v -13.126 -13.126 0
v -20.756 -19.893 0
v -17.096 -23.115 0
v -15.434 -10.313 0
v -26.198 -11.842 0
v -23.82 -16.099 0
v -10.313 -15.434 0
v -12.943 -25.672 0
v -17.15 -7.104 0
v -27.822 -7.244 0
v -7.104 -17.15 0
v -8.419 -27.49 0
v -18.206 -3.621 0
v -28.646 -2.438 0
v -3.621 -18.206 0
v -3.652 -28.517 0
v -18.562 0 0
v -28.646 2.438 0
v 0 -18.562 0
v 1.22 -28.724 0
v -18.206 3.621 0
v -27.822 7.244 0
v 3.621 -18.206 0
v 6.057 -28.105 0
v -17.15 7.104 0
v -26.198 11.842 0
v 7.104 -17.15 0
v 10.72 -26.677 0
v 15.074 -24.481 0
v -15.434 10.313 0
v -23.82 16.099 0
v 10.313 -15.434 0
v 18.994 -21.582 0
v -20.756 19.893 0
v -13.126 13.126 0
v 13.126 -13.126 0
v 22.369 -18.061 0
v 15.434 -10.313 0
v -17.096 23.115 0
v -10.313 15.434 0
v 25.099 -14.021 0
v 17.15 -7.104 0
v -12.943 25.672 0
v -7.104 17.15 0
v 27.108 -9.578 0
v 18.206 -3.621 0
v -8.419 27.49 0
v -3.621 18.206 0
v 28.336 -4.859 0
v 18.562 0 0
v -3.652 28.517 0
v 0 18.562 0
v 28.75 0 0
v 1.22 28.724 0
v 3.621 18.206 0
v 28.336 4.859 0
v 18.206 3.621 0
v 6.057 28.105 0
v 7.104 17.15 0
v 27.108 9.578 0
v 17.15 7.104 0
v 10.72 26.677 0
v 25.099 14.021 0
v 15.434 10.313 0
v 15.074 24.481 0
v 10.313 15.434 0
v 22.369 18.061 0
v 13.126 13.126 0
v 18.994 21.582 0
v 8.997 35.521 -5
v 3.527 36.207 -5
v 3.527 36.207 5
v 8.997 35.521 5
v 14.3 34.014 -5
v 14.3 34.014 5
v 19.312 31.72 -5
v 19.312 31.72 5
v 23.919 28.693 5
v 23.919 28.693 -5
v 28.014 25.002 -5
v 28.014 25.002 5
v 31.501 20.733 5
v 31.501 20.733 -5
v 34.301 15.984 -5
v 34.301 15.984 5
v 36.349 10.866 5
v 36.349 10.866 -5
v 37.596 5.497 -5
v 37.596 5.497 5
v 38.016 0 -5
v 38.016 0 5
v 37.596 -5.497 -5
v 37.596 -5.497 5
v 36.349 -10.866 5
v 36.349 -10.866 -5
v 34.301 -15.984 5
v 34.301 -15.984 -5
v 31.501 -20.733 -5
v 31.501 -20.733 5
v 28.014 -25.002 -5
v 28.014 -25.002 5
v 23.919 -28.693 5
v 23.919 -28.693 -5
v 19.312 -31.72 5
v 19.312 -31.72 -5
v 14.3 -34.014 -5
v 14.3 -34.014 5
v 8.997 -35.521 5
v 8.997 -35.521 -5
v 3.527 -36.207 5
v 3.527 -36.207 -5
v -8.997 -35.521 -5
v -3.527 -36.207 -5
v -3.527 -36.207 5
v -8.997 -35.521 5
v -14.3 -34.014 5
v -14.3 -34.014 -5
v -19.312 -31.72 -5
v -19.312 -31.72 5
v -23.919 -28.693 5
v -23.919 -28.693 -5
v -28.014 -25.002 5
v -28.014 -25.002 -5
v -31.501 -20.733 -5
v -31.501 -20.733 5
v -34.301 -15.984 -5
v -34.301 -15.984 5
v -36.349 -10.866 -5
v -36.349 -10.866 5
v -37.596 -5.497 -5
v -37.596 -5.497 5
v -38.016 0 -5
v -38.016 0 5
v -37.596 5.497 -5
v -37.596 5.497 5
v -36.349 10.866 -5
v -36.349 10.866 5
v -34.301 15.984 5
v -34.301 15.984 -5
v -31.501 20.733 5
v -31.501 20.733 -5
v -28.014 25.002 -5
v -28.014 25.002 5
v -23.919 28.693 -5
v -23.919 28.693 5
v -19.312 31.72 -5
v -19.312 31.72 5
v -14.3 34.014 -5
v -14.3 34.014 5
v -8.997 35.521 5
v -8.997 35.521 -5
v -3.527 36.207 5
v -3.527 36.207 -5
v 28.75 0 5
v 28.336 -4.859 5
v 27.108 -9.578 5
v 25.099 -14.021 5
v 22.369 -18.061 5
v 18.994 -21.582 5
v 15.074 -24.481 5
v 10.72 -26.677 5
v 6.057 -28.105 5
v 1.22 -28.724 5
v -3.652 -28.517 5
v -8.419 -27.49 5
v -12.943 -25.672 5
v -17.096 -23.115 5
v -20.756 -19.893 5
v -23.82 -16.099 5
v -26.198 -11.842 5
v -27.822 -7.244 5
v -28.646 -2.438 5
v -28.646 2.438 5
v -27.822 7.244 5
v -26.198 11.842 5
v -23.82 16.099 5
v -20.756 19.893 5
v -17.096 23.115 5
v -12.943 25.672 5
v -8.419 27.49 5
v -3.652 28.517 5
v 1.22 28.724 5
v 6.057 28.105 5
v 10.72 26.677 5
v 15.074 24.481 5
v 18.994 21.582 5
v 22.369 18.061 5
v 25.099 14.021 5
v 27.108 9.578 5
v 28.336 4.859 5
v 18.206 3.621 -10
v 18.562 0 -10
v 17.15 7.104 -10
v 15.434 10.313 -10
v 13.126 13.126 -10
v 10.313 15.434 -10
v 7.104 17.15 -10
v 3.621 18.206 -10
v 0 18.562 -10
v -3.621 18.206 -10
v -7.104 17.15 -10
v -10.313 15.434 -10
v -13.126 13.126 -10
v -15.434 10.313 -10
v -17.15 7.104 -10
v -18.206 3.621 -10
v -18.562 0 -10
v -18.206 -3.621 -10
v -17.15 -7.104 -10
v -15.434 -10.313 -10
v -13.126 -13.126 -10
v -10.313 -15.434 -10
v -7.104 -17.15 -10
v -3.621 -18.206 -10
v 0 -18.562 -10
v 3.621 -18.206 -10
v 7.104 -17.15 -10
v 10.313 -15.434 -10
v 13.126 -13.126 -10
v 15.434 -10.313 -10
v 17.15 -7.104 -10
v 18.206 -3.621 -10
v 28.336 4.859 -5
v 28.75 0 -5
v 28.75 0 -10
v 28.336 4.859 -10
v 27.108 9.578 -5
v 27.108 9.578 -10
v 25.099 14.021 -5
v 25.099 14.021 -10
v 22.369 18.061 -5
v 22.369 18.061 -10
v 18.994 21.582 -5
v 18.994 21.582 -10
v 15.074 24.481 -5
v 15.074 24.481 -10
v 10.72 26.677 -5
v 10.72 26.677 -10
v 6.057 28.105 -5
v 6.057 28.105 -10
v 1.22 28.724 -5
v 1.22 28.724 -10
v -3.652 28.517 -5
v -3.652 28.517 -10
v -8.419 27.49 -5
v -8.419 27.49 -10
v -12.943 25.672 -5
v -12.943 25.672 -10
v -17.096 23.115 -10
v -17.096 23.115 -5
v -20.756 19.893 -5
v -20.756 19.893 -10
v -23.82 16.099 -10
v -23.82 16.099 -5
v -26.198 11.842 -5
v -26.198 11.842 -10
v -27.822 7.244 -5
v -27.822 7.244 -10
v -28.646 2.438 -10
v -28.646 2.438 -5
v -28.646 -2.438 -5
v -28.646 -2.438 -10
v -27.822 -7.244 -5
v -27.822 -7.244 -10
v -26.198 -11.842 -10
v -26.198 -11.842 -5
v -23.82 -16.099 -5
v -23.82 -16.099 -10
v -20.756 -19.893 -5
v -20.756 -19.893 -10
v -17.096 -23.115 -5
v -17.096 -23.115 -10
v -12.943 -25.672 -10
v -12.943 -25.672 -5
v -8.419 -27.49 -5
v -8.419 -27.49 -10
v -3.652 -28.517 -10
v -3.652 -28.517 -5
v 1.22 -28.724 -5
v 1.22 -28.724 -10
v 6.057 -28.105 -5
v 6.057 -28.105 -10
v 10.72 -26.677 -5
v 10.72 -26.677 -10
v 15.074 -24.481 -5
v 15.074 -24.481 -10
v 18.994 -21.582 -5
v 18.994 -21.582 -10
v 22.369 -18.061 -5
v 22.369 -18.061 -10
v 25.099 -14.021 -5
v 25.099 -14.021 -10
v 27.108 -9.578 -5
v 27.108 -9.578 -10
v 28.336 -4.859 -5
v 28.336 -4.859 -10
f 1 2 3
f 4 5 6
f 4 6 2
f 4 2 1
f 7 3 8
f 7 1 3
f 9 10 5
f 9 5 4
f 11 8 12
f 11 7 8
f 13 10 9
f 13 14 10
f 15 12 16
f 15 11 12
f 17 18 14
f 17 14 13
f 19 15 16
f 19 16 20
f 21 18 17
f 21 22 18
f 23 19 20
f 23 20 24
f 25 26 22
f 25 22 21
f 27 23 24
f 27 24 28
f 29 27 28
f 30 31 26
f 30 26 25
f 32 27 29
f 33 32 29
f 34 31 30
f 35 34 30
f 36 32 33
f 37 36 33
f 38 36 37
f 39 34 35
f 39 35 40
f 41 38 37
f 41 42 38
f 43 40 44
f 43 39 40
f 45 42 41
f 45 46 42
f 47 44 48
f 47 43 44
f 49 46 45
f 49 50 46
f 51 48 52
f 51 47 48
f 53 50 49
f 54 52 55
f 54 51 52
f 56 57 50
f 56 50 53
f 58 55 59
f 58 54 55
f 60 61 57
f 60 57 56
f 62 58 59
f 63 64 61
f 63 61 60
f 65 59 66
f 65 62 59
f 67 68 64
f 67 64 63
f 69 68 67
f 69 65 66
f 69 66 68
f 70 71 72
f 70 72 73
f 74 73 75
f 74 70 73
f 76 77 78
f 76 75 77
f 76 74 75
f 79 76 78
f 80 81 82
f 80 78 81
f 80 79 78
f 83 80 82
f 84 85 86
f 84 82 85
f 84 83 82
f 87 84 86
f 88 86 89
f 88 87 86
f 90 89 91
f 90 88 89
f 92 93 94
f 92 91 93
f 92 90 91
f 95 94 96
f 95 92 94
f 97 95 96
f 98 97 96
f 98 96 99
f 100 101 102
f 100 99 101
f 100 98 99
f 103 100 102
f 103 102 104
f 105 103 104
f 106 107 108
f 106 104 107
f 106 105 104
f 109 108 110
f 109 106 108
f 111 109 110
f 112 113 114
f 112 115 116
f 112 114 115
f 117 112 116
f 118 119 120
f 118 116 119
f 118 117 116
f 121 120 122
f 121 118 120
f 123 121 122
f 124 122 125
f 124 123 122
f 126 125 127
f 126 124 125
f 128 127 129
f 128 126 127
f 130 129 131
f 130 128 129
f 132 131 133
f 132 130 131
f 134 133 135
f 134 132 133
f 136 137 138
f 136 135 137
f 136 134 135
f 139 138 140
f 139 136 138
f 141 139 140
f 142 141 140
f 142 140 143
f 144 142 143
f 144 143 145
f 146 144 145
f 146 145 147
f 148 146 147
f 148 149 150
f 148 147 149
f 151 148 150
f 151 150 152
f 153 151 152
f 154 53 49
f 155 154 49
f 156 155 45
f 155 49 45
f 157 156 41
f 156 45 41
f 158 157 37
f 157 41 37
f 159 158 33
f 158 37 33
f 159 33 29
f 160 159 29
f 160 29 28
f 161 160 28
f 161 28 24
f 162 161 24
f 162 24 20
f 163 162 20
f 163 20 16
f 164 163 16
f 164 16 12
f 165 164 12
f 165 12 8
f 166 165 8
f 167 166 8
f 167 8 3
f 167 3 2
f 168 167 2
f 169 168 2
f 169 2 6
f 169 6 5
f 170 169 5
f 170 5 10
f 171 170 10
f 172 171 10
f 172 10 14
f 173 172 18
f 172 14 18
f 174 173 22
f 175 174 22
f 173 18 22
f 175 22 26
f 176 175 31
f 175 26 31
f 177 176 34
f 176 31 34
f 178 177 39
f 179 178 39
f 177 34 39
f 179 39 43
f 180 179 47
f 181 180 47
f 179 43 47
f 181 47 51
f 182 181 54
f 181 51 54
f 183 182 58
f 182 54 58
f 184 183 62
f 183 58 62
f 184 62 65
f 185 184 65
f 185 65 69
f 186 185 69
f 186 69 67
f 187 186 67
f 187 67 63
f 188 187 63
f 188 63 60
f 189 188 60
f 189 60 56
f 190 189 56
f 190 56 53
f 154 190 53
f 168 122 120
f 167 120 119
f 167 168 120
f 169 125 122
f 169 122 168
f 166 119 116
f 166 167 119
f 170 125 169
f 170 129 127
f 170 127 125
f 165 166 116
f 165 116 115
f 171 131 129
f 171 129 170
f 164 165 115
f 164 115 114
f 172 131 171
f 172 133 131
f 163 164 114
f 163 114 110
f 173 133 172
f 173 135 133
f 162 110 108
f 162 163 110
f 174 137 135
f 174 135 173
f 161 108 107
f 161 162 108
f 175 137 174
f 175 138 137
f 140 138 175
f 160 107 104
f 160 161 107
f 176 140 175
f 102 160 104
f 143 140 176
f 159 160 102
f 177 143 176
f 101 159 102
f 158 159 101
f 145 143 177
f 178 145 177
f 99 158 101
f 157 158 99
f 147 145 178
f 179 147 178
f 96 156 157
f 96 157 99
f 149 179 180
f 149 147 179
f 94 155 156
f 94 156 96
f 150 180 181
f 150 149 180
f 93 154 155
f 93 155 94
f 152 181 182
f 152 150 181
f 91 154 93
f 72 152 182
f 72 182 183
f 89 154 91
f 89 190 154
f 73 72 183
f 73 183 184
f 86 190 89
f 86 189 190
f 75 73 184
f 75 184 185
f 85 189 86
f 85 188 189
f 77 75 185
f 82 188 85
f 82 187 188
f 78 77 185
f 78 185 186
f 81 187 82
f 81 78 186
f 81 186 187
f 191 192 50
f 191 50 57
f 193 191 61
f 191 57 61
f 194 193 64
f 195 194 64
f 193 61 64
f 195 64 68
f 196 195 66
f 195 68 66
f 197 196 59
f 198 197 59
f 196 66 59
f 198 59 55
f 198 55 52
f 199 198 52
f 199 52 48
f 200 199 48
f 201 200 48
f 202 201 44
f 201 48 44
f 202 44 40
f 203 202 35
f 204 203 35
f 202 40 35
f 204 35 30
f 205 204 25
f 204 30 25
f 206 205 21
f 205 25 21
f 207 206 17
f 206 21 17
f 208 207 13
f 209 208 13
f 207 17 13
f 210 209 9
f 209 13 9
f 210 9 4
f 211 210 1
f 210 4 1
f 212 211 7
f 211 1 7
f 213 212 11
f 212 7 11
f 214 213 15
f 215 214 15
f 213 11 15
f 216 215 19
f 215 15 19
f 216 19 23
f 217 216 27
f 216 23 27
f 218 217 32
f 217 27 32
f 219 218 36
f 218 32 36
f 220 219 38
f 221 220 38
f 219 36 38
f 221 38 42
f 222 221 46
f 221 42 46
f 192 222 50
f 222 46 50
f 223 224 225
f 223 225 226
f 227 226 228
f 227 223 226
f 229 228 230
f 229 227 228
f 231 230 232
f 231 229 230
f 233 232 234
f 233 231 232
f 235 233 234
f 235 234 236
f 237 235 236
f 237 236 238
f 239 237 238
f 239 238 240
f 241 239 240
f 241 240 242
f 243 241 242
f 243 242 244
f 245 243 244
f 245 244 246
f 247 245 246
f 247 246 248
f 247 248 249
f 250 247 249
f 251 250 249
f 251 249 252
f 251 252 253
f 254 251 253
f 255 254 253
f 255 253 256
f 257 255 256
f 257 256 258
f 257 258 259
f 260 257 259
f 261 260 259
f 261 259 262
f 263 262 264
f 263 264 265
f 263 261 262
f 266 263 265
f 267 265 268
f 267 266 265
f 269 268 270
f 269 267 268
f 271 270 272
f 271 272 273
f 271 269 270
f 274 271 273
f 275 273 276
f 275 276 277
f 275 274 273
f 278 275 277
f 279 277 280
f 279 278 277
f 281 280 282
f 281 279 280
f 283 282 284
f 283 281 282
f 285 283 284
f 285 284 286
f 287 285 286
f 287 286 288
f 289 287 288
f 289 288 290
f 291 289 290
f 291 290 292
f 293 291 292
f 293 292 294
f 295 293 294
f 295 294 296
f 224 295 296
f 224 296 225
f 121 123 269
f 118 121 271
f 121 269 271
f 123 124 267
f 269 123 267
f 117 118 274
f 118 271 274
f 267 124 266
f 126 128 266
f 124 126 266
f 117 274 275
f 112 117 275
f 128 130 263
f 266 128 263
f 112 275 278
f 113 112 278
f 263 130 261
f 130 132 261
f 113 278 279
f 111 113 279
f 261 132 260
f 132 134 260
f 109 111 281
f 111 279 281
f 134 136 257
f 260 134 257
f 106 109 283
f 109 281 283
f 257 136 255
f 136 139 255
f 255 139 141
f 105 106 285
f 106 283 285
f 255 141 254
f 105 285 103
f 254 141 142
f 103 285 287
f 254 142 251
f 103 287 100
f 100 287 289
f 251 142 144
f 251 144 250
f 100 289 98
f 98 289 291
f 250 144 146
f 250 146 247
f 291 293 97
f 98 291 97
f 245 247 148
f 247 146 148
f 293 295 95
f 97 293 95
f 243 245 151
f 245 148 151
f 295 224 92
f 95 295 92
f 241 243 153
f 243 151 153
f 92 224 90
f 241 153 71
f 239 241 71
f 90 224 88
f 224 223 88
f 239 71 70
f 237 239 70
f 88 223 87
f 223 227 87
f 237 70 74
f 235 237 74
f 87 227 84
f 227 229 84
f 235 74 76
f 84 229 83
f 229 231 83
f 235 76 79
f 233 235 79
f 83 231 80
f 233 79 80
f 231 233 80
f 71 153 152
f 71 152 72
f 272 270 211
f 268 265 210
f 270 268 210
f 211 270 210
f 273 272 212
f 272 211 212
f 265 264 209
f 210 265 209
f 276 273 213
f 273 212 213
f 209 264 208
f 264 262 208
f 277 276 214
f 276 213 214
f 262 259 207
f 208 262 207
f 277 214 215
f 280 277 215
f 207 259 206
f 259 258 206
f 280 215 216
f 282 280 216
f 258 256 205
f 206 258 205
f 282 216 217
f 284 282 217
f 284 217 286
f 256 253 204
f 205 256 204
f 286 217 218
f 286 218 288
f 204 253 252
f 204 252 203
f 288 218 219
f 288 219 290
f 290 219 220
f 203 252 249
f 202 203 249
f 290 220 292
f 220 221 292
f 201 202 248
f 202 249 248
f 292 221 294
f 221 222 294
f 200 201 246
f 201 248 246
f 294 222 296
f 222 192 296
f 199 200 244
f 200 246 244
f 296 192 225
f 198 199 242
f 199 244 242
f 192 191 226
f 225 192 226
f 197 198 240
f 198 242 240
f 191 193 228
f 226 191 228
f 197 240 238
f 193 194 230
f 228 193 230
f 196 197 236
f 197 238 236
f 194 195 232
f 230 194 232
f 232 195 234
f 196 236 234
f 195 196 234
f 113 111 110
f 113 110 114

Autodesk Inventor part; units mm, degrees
ref_plane "YZ Plane" through (0, 0, 0) normal (1, 0, 0) x (0, 1, 0)
ref_plane "XZ Plane" through (0, 0, 0) normal (0, 1, 0) x (-1, 0, 0)
ref_plane "XY Plane" through (0, 0, 0) normal (0, 0, 1) x (1, 0, 0)
sketch "Sketch1" plane through (0, 0, 0) normal (0, 0, 1) x (1, 0, 0)
  circle A0 centre (0, 0) radius 28.75
  line L0 (3.5274, -36.2072) -> (-3.5274, -36.2072)
  line L1 (-3.5274, 36.2072) -> (3.5274, 36.2072)
  arc A1 (3.5274, -36.2072) -> (3.5274, 36.2072) centre (1.7656, 0) ccw
  arc A2 (-3.5274, 36.2072) -> (-3.5274, -36.2072) centre (-1.7656, 0) ccw
  line L2 (3.3345, -28.7072) -> (-3.3345, -28.7072)
  point P0 (0, 0)
  point P1 (0, 36.2072)
  point P2 (0, 0)
  point P3 (0, -28.7072)
  dimension "d0" = 57.5
  dimension "d1" = 36.25
  dimension "d2" = 36.25
  dimension "d8" = 7.0549
extrude "Extrusion1" add sketch "Sketch1" along normal mid plane 10
sketch "Sketch2" plane through (0, 0, 0) normal (0, 0, 1) x (1, 0, 0)
  circle A0 centre (0, 0) radius 28.75 projected
  circle A1 centre (0, 0) radius 18.5625
  dimension "d5" = 37.125
extrude "Extrusion2" add sketch "Sketch2" against normal blind 10
ref_plane "Work Plane1" through (0, 36.2072, 5) normal (-1, 0, 0) x (0, 0, -1)
properties part number "Tilting head - cover side part" material "Steel, Carbon"
